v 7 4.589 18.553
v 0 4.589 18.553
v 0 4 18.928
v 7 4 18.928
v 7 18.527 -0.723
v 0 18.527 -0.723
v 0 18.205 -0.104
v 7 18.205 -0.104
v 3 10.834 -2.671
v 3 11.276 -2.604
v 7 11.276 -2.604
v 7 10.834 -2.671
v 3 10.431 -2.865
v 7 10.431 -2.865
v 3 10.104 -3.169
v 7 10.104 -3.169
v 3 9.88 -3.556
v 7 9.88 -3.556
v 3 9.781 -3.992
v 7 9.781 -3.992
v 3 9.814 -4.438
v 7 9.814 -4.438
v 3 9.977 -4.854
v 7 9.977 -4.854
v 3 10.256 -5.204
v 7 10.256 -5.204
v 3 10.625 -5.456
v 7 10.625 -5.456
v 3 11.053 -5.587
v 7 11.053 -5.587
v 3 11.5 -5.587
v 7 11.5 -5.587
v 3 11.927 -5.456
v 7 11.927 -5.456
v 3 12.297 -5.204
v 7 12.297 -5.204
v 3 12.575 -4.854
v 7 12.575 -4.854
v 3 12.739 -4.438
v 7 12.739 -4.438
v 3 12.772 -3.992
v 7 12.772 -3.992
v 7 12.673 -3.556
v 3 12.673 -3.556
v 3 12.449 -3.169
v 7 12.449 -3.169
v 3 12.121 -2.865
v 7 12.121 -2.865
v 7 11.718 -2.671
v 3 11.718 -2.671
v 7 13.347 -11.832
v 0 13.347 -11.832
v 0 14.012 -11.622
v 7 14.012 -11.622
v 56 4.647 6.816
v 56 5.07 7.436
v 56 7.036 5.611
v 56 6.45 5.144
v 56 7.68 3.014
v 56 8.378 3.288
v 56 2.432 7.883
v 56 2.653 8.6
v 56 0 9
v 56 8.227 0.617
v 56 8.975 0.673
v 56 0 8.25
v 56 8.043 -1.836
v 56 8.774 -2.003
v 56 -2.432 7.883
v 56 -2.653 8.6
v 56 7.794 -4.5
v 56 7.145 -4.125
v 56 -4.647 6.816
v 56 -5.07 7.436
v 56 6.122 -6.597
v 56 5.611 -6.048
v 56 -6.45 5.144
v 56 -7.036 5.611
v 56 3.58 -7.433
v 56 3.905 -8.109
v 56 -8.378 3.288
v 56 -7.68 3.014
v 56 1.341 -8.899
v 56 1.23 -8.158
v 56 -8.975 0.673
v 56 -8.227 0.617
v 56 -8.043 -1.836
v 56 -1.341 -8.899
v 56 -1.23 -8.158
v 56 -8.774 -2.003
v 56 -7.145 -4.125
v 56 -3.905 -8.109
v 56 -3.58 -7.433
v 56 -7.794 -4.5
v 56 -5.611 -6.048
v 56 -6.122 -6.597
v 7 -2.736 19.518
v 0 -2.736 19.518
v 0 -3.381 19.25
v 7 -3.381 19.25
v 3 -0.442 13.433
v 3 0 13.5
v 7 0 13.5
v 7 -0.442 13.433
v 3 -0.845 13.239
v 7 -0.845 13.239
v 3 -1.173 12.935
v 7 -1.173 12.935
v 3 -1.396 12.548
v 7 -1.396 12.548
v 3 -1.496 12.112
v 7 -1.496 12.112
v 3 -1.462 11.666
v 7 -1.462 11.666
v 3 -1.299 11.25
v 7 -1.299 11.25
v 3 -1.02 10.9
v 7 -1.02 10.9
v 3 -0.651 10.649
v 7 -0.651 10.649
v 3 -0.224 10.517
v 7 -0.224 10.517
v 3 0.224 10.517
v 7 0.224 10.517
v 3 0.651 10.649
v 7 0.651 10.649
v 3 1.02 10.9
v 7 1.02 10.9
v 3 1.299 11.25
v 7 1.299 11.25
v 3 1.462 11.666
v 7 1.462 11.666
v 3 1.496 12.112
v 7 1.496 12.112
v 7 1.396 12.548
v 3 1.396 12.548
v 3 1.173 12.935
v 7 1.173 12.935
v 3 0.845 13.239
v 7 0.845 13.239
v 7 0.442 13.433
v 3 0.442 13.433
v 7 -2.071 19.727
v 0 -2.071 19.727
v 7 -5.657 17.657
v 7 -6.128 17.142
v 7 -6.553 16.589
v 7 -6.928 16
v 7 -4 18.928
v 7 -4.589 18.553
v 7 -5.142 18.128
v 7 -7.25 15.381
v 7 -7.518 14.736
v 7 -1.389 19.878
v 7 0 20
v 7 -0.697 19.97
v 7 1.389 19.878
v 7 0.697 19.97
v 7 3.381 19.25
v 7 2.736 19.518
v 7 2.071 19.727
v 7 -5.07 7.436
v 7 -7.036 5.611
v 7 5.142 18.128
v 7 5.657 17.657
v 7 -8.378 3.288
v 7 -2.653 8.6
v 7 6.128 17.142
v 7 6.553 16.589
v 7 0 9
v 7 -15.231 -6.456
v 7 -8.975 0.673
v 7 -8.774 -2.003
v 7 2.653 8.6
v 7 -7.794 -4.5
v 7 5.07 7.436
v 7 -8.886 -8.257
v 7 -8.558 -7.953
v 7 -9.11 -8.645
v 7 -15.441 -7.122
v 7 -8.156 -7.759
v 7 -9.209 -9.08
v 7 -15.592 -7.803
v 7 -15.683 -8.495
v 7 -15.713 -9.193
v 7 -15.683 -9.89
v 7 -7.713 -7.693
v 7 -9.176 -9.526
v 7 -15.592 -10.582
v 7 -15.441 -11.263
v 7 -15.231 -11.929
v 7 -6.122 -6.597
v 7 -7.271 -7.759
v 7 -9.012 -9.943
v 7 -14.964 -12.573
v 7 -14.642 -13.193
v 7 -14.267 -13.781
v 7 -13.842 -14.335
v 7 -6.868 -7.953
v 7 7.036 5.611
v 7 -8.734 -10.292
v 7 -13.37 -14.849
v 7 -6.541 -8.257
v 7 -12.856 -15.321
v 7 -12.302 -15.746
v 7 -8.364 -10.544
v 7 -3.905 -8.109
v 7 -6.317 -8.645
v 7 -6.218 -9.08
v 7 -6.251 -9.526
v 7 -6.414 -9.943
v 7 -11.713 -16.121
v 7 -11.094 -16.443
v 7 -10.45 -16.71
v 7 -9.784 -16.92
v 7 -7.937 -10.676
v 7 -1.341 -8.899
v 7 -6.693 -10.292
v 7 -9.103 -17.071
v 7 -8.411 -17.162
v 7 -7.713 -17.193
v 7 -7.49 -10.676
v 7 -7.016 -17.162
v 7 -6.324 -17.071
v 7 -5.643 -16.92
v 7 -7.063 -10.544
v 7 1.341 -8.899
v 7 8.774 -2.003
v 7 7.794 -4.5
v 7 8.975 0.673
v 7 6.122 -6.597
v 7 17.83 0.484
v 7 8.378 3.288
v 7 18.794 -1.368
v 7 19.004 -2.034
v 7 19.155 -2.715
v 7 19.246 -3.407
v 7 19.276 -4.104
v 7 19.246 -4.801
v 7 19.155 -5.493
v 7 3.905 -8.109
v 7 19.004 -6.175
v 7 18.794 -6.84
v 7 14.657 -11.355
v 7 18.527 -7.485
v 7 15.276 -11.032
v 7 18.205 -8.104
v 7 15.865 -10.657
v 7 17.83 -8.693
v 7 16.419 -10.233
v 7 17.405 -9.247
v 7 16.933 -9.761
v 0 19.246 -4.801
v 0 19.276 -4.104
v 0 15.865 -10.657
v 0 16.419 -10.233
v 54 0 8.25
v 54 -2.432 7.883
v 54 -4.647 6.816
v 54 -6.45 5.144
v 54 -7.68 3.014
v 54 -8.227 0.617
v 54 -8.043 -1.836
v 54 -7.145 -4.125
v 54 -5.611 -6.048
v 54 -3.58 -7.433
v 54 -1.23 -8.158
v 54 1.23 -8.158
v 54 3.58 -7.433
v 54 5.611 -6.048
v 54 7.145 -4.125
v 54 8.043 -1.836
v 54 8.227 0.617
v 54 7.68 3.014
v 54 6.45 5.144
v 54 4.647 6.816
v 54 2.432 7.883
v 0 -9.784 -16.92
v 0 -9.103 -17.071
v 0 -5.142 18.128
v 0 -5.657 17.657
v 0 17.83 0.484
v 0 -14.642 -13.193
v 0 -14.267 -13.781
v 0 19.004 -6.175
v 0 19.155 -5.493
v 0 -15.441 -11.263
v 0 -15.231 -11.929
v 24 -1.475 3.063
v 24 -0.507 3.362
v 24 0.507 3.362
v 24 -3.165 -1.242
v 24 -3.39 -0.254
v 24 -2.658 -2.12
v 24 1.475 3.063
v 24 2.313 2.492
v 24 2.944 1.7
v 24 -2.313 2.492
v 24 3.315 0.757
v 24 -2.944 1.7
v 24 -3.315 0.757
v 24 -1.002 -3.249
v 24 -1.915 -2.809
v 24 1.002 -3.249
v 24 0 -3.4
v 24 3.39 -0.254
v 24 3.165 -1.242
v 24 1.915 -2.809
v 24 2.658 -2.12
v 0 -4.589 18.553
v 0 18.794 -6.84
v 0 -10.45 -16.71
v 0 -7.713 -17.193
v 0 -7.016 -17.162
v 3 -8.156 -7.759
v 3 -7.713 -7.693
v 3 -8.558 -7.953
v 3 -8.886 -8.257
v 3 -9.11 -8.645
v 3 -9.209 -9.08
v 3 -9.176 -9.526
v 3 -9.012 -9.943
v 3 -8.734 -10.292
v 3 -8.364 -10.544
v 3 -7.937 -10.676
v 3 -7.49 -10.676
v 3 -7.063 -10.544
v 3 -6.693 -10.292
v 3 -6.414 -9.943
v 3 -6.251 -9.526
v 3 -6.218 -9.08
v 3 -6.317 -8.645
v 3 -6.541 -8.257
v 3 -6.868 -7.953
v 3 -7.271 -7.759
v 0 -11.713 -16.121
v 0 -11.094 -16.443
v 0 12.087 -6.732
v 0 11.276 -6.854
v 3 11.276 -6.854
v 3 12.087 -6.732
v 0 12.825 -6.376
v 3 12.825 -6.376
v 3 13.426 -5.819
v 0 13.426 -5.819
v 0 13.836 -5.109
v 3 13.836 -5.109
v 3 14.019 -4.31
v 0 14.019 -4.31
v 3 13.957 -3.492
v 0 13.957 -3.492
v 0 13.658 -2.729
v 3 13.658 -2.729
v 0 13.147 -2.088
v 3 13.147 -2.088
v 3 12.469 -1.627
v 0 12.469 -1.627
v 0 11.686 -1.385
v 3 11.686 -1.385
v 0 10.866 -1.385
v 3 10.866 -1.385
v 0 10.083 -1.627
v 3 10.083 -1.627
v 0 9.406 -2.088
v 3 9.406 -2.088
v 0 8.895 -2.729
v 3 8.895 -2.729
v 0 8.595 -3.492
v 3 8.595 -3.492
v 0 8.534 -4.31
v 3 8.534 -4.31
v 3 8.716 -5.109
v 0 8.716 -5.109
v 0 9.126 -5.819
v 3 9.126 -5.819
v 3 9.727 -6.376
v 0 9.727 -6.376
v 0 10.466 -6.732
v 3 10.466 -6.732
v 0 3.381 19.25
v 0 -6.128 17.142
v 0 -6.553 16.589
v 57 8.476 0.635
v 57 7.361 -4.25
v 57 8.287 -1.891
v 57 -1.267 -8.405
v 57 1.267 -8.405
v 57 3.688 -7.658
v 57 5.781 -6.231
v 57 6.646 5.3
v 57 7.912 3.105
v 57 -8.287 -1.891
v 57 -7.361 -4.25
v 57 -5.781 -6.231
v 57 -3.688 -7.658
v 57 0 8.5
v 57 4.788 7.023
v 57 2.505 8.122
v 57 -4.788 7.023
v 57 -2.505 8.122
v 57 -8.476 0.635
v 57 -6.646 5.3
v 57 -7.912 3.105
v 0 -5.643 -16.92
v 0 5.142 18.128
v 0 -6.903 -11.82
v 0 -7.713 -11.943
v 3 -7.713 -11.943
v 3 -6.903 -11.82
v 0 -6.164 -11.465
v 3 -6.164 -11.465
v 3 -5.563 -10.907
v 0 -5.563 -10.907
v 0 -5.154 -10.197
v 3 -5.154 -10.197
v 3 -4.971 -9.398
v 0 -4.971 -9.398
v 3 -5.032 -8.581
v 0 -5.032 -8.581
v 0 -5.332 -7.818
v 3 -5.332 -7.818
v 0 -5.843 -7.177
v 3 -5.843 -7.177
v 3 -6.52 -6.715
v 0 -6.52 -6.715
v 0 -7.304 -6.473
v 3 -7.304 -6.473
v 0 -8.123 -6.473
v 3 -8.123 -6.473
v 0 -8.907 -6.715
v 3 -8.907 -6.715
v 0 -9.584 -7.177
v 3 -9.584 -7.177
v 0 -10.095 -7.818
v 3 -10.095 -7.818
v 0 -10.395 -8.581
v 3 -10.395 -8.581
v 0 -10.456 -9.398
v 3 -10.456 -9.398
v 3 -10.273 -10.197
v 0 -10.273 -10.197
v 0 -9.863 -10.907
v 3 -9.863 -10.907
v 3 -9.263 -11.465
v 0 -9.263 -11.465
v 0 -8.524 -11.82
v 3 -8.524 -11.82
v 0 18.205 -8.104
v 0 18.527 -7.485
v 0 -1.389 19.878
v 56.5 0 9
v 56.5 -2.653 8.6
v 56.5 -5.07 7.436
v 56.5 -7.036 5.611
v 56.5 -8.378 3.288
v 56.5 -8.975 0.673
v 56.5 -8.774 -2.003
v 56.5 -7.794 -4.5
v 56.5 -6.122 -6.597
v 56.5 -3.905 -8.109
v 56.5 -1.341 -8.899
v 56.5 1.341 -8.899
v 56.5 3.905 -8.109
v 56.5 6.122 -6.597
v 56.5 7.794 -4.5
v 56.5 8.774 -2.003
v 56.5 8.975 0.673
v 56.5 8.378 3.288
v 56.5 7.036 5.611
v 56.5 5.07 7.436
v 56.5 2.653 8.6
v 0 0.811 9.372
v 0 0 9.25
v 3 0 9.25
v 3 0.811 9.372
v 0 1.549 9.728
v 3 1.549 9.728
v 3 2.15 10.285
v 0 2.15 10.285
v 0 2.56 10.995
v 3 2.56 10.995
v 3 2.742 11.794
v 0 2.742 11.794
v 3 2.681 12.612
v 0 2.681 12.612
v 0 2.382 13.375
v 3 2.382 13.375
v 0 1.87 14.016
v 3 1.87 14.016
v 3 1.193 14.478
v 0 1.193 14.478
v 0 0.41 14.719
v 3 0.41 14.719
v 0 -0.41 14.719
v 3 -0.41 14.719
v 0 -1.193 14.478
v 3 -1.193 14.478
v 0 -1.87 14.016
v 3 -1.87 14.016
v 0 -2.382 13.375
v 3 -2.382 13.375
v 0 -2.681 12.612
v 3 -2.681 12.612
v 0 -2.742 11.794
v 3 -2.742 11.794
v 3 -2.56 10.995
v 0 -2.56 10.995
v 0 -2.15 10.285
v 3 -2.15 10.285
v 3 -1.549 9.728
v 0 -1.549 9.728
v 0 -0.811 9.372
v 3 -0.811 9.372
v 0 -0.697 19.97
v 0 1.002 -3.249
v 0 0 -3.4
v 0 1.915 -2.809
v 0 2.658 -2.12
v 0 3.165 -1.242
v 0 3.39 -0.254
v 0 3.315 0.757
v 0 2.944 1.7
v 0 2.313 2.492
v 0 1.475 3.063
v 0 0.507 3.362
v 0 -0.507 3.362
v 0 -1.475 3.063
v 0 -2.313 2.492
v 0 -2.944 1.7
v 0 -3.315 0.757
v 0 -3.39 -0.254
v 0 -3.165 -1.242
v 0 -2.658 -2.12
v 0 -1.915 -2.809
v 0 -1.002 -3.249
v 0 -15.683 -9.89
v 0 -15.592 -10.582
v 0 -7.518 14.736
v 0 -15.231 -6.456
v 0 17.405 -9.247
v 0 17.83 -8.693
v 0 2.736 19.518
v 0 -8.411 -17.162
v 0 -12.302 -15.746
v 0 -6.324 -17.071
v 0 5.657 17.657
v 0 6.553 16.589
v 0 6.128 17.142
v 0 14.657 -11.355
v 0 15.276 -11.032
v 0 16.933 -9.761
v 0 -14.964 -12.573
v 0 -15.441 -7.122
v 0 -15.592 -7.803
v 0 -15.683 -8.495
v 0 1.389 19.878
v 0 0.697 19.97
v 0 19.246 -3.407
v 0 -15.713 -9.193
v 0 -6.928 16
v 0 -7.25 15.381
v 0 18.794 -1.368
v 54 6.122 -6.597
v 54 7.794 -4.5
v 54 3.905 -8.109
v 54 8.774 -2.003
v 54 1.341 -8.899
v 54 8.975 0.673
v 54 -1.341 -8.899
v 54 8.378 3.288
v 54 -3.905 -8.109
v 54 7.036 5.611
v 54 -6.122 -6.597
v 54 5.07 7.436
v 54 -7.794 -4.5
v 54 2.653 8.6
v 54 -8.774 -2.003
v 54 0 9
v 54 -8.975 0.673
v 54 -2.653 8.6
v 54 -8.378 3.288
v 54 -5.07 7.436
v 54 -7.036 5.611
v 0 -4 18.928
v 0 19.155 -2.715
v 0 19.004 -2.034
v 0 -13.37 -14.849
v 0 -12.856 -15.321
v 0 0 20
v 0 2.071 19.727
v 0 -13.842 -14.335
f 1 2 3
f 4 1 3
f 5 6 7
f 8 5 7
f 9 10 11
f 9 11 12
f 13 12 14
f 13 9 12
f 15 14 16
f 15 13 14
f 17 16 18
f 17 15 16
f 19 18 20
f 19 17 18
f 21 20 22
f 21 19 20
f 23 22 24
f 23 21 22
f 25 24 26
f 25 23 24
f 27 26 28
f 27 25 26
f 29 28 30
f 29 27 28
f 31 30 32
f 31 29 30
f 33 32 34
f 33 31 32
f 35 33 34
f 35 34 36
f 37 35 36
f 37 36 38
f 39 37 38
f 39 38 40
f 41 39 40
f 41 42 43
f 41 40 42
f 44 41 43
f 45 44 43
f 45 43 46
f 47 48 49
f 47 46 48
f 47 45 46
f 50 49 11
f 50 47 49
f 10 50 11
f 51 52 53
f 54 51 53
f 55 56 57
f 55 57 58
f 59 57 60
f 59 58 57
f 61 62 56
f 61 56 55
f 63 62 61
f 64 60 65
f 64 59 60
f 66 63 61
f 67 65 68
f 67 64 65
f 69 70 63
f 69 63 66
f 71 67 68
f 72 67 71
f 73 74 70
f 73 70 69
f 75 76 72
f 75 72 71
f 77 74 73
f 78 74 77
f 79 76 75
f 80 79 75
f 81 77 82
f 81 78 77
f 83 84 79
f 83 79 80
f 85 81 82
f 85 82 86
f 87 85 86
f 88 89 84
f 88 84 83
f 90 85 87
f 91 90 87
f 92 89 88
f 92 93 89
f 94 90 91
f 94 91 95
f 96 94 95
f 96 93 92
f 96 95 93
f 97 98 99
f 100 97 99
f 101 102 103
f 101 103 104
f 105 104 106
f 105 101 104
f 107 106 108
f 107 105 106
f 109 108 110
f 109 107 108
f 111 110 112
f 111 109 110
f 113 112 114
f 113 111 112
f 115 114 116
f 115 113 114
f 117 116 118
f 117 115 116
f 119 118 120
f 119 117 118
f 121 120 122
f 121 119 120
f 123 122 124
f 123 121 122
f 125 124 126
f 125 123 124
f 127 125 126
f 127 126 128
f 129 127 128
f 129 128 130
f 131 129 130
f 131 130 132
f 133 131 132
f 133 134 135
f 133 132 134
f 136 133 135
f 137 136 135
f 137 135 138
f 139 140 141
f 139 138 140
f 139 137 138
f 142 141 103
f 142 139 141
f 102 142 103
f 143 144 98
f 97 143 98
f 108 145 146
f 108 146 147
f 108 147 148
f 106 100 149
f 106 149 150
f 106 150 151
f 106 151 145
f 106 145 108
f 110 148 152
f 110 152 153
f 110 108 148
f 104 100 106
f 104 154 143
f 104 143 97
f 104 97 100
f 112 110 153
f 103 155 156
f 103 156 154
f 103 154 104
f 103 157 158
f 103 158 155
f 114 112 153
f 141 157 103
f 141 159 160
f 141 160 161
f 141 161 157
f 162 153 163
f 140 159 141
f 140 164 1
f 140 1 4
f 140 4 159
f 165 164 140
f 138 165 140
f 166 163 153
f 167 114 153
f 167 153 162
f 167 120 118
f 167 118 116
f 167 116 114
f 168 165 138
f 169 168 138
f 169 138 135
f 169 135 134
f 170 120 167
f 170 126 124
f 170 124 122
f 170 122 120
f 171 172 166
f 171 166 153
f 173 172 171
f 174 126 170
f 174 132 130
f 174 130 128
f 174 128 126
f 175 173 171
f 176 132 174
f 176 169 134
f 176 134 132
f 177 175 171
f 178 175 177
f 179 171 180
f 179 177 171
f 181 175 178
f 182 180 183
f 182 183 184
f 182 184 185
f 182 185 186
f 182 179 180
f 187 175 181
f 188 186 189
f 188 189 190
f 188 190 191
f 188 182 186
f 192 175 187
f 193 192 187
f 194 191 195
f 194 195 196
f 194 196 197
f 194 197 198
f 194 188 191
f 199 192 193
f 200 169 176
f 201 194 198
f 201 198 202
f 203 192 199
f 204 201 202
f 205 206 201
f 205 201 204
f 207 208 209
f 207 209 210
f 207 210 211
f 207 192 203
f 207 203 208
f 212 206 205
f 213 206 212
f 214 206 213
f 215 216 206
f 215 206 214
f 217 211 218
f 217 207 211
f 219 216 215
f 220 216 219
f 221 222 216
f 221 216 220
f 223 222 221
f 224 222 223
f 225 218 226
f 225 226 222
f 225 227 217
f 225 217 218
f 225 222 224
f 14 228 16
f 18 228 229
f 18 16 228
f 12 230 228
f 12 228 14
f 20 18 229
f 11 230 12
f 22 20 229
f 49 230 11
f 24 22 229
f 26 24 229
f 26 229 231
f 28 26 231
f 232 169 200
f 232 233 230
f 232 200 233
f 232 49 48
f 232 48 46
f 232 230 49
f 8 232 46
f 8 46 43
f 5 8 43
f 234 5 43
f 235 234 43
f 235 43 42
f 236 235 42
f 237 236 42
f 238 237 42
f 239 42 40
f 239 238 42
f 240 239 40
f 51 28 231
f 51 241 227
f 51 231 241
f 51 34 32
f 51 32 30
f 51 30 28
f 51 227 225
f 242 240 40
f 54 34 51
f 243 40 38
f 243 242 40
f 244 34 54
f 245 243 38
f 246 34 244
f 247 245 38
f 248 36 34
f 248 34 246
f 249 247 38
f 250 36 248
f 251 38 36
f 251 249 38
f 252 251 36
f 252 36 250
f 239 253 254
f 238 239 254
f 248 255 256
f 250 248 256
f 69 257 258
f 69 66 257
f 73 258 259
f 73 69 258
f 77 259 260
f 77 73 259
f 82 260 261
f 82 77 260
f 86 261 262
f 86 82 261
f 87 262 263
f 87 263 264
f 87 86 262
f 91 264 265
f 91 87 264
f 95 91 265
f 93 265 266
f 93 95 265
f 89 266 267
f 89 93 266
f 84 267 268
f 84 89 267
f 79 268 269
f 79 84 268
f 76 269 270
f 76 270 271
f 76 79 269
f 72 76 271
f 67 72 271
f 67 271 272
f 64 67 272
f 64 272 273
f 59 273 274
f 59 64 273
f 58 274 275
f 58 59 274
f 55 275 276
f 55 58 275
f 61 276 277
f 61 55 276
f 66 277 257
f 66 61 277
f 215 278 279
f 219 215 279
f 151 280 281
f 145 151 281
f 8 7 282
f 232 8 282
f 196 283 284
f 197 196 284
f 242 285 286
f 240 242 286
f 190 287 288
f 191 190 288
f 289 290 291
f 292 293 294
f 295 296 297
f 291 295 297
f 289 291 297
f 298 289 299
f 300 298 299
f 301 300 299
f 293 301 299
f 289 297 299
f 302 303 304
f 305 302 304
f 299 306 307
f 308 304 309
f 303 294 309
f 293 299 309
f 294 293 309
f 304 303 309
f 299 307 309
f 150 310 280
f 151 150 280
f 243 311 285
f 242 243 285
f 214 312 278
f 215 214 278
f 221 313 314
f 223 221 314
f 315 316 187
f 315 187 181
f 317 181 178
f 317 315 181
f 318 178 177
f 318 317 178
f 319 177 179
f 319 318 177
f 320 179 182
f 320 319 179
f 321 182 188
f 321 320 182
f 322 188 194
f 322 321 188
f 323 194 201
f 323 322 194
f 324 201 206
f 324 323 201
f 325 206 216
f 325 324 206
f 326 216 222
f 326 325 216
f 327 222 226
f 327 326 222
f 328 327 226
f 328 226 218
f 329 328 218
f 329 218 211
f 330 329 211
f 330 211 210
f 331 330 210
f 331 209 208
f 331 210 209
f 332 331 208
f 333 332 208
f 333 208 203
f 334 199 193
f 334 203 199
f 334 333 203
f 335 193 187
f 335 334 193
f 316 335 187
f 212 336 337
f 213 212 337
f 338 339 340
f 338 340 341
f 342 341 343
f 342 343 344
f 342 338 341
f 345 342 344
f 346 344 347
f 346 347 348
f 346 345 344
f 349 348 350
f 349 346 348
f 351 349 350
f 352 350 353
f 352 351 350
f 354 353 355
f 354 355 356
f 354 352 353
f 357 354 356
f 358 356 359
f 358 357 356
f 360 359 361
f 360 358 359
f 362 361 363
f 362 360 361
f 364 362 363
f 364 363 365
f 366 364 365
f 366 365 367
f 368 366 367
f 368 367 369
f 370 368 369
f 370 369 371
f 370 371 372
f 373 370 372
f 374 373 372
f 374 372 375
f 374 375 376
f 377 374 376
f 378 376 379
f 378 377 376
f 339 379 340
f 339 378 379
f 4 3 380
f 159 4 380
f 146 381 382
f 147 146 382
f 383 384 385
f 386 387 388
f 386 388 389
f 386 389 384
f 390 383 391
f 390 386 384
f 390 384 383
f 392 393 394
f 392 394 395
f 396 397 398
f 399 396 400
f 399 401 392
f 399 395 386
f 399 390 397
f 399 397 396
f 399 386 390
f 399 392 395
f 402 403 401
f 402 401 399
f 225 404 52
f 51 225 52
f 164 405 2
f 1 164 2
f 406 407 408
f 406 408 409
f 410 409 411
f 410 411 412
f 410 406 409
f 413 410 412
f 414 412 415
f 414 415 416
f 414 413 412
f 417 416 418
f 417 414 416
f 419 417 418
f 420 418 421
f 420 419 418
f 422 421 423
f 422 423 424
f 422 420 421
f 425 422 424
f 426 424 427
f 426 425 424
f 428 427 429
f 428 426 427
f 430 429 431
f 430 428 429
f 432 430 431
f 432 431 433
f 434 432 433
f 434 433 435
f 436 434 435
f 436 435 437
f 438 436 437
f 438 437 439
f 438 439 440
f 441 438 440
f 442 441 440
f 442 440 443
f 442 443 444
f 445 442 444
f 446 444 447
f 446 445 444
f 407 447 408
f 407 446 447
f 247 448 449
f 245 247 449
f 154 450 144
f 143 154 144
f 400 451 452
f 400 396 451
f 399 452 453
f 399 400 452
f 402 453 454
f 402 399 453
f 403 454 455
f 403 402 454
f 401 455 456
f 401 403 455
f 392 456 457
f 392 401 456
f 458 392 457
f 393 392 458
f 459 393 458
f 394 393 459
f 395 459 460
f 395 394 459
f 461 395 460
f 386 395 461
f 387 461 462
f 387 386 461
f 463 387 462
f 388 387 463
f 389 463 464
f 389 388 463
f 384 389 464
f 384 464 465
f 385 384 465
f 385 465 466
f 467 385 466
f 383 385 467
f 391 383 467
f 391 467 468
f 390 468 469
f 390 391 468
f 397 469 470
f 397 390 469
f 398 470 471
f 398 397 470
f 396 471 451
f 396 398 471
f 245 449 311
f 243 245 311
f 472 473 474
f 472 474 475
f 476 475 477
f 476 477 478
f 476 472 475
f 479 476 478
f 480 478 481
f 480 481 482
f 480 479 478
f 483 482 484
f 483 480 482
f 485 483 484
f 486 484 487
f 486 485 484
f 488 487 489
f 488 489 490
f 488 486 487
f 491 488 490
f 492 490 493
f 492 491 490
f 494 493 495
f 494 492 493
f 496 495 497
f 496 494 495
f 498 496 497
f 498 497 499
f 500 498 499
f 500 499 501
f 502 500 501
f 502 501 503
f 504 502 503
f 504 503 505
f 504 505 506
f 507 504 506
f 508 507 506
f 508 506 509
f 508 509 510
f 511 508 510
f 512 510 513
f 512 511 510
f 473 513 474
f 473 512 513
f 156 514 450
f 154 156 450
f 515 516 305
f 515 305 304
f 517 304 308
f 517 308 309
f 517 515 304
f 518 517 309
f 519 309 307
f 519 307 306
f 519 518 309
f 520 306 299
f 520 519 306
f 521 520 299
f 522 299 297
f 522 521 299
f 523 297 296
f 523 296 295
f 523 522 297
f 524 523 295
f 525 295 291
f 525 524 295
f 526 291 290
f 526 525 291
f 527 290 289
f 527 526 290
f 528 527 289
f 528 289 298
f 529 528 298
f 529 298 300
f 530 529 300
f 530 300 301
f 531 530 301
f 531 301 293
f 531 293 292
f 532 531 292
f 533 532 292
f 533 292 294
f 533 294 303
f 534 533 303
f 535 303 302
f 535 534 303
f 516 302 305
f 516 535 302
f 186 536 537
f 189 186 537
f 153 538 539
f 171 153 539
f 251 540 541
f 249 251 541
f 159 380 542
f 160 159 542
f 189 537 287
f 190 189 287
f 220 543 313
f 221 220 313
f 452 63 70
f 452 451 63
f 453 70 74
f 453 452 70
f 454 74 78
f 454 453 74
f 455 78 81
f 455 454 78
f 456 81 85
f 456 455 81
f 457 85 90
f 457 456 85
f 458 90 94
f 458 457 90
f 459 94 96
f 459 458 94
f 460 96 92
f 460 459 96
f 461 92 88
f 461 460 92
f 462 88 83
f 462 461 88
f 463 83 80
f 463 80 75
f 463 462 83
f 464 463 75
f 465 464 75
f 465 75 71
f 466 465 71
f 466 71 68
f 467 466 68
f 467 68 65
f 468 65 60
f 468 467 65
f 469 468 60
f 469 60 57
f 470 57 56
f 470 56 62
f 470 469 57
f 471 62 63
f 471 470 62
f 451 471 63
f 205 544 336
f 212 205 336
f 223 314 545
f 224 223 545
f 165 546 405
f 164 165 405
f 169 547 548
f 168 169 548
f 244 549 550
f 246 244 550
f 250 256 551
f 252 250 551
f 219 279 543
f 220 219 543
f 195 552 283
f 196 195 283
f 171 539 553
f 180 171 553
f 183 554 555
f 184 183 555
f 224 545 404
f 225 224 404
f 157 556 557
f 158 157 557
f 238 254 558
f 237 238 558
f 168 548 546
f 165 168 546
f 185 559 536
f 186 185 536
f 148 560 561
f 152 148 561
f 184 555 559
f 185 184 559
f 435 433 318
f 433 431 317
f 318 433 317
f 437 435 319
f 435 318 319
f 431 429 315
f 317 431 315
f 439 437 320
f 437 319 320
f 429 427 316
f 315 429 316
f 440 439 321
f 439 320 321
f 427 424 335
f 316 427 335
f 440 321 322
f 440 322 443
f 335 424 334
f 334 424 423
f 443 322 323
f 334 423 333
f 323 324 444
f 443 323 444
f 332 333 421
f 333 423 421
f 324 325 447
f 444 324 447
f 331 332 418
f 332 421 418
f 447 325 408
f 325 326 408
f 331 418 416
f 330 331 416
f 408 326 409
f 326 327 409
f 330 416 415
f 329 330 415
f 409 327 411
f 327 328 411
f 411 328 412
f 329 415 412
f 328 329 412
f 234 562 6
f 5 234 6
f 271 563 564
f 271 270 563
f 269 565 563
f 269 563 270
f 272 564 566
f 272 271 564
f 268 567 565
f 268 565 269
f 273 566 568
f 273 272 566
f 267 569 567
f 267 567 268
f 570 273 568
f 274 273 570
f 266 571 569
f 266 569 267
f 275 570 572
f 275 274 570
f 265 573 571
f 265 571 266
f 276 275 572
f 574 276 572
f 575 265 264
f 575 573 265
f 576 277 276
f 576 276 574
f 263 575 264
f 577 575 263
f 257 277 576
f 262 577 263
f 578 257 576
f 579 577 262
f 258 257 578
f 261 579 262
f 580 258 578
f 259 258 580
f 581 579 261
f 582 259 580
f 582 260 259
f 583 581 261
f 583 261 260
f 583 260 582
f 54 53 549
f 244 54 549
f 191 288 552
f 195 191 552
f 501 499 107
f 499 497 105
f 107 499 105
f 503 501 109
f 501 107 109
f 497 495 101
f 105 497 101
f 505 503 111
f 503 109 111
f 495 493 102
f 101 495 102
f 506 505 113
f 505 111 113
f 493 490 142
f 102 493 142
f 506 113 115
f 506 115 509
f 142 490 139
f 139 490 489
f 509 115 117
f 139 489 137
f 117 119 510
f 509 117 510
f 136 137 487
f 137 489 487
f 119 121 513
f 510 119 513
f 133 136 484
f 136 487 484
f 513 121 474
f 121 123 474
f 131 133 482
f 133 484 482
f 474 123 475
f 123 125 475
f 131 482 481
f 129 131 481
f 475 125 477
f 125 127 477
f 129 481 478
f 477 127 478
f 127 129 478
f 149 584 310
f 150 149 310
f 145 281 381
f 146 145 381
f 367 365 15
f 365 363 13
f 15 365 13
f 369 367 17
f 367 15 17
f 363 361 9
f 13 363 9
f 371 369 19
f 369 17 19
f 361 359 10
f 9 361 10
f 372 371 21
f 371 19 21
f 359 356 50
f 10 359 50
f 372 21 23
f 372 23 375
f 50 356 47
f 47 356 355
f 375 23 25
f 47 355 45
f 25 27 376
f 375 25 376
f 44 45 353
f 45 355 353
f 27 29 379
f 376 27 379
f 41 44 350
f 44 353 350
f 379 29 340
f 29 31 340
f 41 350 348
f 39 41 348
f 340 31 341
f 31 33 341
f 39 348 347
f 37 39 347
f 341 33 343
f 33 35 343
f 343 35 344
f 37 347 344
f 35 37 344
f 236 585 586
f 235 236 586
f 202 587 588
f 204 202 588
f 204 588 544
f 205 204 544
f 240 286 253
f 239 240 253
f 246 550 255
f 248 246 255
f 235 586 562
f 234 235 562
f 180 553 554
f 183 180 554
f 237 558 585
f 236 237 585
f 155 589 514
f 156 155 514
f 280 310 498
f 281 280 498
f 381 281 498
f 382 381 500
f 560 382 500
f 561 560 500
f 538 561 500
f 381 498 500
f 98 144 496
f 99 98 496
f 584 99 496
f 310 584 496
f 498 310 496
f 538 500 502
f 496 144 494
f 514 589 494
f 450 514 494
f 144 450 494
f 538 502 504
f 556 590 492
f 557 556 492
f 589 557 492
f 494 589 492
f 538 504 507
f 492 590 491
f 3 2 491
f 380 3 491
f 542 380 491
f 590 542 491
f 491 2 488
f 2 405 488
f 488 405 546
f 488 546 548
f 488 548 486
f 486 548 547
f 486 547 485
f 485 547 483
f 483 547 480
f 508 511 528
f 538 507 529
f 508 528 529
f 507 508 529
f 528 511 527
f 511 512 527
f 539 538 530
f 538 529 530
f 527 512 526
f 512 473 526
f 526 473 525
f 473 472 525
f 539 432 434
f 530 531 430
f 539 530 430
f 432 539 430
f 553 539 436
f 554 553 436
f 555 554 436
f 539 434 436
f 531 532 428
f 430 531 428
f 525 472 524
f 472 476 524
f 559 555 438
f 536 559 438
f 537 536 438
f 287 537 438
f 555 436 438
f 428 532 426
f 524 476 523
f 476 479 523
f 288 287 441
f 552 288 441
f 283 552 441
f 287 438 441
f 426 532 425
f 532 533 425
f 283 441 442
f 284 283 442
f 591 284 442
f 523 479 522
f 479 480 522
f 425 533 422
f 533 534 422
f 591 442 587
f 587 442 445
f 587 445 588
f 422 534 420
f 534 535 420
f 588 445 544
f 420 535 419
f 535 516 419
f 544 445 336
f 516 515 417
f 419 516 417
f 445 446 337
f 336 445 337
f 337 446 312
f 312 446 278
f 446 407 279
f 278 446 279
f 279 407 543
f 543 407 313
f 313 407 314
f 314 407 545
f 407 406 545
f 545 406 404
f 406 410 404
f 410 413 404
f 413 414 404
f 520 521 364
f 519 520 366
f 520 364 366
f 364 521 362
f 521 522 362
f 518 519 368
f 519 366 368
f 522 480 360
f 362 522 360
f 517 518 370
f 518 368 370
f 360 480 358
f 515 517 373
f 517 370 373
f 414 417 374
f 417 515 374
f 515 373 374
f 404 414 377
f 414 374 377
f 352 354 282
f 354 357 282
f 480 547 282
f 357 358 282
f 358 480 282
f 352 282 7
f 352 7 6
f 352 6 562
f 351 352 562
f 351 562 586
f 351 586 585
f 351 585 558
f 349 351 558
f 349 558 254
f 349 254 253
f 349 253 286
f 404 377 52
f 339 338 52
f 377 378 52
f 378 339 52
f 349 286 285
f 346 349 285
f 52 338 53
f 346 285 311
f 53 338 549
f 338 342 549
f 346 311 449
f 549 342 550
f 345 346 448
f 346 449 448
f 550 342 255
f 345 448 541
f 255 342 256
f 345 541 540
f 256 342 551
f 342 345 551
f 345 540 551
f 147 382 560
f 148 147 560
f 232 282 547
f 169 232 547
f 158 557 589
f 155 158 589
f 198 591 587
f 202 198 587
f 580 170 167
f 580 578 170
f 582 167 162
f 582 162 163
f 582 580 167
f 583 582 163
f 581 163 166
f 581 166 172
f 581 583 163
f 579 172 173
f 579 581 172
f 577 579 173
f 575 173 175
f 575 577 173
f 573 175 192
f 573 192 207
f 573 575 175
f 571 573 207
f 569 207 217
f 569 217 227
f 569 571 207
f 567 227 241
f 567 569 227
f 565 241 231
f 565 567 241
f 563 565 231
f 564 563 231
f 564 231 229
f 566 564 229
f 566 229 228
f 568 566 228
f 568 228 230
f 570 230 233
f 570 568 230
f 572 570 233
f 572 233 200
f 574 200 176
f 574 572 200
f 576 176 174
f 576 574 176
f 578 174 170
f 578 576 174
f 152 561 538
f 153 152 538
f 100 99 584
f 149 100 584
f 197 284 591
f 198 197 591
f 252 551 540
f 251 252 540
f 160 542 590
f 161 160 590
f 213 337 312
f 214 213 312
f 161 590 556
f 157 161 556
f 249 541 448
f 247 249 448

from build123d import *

# Parameters (mm, degrees)
F_02_HEAD_DEPTH        = 7
SKETCH_3_R             = 1.5
F_03_SCREW_HOLES_DEPTH = 64.408013115
SKETCH_4_R             = 2.75
F_04_CBORE_DEPTH       = 3
SKETCH_5_R             = 3.4
F_05_M8_TAP_DEPTH      = 24


with BuildPart() as part:
    # 草图1 → 旋转1 (revolve)
    with BuildSketch(Plane.XY, mode=Mode.PRIVATE) as revolve_1_sk:
        Polygon((7, 0), (7, 9), (54, 9), (54, 8.25), (56, 8.25), (56, 9), (56.5, 9), (57, 8.5), (57, 0), align=None)
    revolve(revolve_1_sk.sketch.rotate(Axis((2, 0, 0), (1, 0, 0)), 90), axis=Axis((2, 0, 0), (1, 0, 0)))

    # 草图2 → 02_HEAD (add)
    with BuildSketch(Plane(origin=(0, 0, 0), x_dir=(0, 0, -1), z_dir=(1, 0, 0))):
        Polygon((-20, 0), (-19.96956, -0.69725), (-19.87846, -1.38919), (-19.72741, -2.07055), (-19.51754, -2.73616), (-19.25046, -3.38095), (-18.9282, -4), (-18.55322, -4.58861), (-18.12836, -5.1423), (-17.65685, -5.65685), (-17.1423, -6.12836), (-16.58861, -6.55322), (-16, -6.9282), (-15.38095, -7.25046), (-14.73616, -7.51754), (6.45637, -15.23099), (7.12198, -15.44086), (7.80335, -15.59191), (8.49529, -15.68301), (9.19253, -15.71345), (9.88978, -15.68301), (10.58172, -15.59191), (11.26309, -15.44086), (11.92869, -15.23099), (12.57348, -14.96391), (13.19253, -14.64165), (13.78114, -14.26667), (14.33483, -13.84181), (14.84939, -13.37031), (15.32089, -12.85575), (15.74575, -12.30206), (16.12074, -11.71345), (16.443, -11.0944), (16.71007, -10.44961), (16.91994, -9.784), (17.071, -9.10264), (17.16209, -8.4107), (17.19253, -7.71345), (17.16209, -7.01621), (17.071, -6.32427), (16.91994, -5.6429), (11.83165, 13.34686), (11.62178, 14.01247), (11.3547, 14.65726), (11.03244, 15.27631), (10.65746, 15.86492), (10.2326, 16.41861), (9.7611, 16.93317), (9.24654, 17.40467), (8.69285, 17.82953), (8.10424, 18.20451), (7.48519, 18.52677), (6.8404, 18.79385), (6.17479, 19.00372), (5.49343, 19.15477), (4.80149, 19.24587), (4.10424, 19.27631), (3.407, 19.24587), (2.71506, 19.15477), (2.03369, 19.00372), (1.36808, 18.79385), (0.7233, 18.52677), (0.10424, 18.20451), (-0.48437, 17.82953), (-16.58861, 6.55322), (-17.1423, 6.12836), (-17.65685, 5.65685), (-18.12836, 5.1423), (-18.55322, 4.58861), (-18.9282, 4), (-19.25046, 3.38095), (-19.51754, 2.73616), (-19.72741, 2.07055), (-19.87846, 1.38919), (-19.96956, 0.69725), align=None)
    extrude(amount=F_02_HEAD_DEPTH)

    # 草图3 → 03_SCREW_HOLES (cut, through all)
    with BuildSketch(Plane(origin=(0, 0, 0), x_dir=(0, 0, -1), z_dir=(1, 0, 0))):
        with Locations(Location((-12, 0, 0), (0, 0, 180))):
            Circle(SKETCH_3_R)
        with Locations(Location((4.10424172, 11.276311449, 0), (0, 0, 180))):
            Circle(SKETCH_3_R)
        with Locations(Location((9.192533317, -7.713451316, 0), (0, 0, 180))):
            Circle(SKETCH_3_R)
    extrude(amount=F_03_SCREW_HOLES_DEPTH, mode=Mode.SUBTRACT)

    # 草图4 → 04_CBORE (cut)
    with BuildSketch(Plane(origin=(0, 0, 0), x_dir=(0, 0, -1), z_dir=(1, 0, 0))):
        with Locations((-12, 0)):
            Circle(SKETCH_4_R)
        with Locations((4.10424172, 11.276311449)):
            Circle(SKETCH_4_R)
        with Locations((9.192533317, -7.713451316)):
            Circle(SKETCH_4_R)
    extrude(amount=F_04_CBORE_DEPTH, mode=Mode.SUBTRACT)

    # 草图5 → 05_M8_TAP (cut)
    with BuildSketch(Plane(origin=(0, 0, 0), x_dir=(0, 0, -1), z_dir=(1, 0, 0))):
        Circle(SKETCH_5_R)
    extrude(amount=F_05_M8_TAP_DEPTH, mode=Mode.SUBTRACT)


solid = part.part
